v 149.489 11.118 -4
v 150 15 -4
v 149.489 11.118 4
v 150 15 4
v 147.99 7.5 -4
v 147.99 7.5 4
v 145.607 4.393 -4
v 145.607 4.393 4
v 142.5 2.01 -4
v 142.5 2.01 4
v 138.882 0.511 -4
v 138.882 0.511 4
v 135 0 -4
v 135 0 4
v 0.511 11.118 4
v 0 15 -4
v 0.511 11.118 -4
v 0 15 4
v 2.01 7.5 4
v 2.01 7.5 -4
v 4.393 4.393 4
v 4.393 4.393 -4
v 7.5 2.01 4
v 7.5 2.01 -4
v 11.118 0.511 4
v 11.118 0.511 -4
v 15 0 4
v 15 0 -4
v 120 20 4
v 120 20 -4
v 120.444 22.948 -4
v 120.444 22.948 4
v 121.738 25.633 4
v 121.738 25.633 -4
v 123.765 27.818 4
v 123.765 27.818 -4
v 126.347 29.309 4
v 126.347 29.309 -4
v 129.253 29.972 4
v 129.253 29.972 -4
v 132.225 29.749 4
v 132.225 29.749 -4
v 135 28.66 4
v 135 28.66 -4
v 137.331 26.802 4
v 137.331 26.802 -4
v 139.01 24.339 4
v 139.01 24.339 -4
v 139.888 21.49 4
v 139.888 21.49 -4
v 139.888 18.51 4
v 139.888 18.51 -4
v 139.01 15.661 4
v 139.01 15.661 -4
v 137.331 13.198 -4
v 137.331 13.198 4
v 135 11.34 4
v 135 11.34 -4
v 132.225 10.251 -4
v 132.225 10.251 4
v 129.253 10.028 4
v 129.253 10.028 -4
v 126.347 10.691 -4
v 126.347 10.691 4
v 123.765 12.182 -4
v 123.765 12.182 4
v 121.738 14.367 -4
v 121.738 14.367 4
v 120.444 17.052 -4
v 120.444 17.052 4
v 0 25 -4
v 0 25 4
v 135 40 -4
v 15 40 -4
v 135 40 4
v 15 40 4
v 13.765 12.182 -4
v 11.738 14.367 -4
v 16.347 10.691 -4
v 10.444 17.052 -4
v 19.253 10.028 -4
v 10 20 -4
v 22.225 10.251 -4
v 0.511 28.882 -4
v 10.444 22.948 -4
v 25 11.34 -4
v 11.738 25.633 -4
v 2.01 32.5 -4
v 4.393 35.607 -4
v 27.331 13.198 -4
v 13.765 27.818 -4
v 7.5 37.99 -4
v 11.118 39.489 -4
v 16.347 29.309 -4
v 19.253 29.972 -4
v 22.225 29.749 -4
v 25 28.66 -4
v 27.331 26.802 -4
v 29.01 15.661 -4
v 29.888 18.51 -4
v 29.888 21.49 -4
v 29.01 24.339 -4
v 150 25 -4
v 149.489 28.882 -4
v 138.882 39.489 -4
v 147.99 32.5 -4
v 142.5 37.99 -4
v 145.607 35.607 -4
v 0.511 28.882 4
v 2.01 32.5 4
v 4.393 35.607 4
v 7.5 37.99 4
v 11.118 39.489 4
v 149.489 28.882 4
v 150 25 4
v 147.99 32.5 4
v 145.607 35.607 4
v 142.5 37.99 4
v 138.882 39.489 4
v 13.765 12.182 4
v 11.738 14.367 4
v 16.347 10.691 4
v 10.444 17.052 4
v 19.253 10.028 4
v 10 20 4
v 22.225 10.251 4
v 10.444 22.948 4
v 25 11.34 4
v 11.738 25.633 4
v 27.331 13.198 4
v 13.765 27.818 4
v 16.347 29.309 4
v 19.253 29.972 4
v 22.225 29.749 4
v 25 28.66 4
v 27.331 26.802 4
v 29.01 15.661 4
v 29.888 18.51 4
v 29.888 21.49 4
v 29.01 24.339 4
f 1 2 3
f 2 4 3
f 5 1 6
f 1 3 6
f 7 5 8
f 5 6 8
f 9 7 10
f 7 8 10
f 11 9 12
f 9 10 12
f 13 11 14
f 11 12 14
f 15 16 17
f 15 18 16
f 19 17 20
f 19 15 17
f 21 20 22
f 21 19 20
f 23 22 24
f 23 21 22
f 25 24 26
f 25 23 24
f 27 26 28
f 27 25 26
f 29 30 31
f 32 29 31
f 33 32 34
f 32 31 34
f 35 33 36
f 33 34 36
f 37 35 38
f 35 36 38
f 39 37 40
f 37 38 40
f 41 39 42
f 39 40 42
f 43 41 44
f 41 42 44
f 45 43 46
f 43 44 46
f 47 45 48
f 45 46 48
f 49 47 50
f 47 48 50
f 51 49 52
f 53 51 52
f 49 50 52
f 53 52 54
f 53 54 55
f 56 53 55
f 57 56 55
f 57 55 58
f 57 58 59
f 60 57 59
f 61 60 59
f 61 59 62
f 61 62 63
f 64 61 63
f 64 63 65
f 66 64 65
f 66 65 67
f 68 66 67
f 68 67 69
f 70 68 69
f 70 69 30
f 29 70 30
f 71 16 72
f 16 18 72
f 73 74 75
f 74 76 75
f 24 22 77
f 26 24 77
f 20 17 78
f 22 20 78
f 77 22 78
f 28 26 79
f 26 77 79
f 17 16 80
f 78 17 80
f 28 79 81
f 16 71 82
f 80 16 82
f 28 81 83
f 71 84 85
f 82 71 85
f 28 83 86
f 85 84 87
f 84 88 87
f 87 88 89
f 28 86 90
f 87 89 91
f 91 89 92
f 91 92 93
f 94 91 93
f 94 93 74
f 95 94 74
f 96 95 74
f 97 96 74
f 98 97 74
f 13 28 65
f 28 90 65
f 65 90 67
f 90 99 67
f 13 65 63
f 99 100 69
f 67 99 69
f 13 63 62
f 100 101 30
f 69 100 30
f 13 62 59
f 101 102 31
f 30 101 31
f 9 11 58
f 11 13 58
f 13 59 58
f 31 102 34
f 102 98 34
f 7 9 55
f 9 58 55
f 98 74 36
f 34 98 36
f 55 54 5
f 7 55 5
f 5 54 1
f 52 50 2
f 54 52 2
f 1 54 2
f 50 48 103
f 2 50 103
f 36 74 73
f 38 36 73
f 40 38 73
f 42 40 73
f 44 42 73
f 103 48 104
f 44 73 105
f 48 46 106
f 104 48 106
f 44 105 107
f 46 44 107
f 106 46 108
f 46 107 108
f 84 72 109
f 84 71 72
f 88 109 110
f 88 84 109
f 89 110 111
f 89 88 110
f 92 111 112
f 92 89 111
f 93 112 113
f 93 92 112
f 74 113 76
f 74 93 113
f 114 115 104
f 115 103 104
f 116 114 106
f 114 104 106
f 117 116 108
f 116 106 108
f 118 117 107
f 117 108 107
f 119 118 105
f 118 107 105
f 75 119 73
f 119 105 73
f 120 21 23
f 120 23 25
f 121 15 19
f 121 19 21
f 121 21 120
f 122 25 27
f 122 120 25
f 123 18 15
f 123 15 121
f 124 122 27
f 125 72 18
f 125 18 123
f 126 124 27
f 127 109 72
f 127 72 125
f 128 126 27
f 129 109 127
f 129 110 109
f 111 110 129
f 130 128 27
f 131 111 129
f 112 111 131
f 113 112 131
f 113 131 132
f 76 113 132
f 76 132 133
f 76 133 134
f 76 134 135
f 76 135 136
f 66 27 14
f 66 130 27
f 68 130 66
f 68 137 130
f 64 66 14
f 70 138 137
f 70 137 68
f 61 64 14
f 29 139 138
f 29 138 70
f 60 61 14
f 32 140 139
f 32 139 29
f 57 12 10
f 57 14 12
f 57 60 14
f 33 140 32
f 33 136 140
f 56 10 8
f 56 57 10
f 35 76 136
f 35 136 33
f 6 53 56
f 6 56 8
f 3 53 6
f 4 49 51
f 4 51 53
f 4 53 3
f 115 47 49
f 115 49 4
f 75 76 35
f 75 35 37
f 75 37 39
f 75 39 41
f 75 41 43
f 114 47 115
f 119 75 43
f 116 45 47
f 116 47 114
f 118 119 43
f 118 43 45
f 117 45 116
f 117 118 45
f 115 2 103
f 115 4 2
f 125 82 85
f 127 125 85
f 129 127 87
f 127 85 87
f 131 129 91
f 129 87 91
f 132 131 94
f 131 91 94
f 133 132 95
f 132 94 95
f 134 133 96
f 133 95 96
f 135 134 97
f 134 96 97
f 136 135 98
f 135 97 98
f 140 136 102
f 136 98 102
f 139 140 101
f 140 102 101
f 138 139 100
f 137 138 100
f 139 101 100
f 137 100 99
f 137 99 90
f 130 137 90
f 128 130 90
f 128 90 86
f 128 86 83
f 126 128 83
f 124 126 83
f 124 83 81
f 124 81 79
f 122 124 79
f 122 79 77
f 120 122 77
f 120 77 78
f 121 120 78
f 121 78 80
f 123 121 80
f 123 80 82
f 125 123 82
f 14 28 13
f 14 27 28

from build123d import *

# Parameters (mm, degrees)
ESBO_O1_W                = 150
ESBO_O1_H                = 40
RESSALTO_EXTRUS_O1_DEPTH = 4
FILETE2_R                = 15
FUROS_GUIA_COM_20_0MM1_D = 20


with BuildPart() as part:
    # Esboço1 → Ressalto-extrusão1 (new, symmetric)
    with BuildSketch(Plane.XY):
        with Locations((75, 20)):
            Rectangle(ESBO_O1_W, ESBO_O1_H)
    extrude(amount=RESSALTO_EXTRUS_O1_DEPTH, both=True)

    # Filete2
    filete2_edges = [part.edges().sort_by_distance(p)[0] for p in [
        (0, 0, 0),
        (0, 40, 0),
        (150, 40, 0),
        (150, 0, 0),
    ]]
    fillet(filete2_edges, radius=FILETE2_R)

    # Furos-guia com Ø20.0mm1 (through all)
    with Locations(Plane.XY.offset(4)):
        with Locations((20, 20), (130, 20)):
            Hole(FUROS_GUIA_COM_20_0MM1_D / 2)


solid = part.part
